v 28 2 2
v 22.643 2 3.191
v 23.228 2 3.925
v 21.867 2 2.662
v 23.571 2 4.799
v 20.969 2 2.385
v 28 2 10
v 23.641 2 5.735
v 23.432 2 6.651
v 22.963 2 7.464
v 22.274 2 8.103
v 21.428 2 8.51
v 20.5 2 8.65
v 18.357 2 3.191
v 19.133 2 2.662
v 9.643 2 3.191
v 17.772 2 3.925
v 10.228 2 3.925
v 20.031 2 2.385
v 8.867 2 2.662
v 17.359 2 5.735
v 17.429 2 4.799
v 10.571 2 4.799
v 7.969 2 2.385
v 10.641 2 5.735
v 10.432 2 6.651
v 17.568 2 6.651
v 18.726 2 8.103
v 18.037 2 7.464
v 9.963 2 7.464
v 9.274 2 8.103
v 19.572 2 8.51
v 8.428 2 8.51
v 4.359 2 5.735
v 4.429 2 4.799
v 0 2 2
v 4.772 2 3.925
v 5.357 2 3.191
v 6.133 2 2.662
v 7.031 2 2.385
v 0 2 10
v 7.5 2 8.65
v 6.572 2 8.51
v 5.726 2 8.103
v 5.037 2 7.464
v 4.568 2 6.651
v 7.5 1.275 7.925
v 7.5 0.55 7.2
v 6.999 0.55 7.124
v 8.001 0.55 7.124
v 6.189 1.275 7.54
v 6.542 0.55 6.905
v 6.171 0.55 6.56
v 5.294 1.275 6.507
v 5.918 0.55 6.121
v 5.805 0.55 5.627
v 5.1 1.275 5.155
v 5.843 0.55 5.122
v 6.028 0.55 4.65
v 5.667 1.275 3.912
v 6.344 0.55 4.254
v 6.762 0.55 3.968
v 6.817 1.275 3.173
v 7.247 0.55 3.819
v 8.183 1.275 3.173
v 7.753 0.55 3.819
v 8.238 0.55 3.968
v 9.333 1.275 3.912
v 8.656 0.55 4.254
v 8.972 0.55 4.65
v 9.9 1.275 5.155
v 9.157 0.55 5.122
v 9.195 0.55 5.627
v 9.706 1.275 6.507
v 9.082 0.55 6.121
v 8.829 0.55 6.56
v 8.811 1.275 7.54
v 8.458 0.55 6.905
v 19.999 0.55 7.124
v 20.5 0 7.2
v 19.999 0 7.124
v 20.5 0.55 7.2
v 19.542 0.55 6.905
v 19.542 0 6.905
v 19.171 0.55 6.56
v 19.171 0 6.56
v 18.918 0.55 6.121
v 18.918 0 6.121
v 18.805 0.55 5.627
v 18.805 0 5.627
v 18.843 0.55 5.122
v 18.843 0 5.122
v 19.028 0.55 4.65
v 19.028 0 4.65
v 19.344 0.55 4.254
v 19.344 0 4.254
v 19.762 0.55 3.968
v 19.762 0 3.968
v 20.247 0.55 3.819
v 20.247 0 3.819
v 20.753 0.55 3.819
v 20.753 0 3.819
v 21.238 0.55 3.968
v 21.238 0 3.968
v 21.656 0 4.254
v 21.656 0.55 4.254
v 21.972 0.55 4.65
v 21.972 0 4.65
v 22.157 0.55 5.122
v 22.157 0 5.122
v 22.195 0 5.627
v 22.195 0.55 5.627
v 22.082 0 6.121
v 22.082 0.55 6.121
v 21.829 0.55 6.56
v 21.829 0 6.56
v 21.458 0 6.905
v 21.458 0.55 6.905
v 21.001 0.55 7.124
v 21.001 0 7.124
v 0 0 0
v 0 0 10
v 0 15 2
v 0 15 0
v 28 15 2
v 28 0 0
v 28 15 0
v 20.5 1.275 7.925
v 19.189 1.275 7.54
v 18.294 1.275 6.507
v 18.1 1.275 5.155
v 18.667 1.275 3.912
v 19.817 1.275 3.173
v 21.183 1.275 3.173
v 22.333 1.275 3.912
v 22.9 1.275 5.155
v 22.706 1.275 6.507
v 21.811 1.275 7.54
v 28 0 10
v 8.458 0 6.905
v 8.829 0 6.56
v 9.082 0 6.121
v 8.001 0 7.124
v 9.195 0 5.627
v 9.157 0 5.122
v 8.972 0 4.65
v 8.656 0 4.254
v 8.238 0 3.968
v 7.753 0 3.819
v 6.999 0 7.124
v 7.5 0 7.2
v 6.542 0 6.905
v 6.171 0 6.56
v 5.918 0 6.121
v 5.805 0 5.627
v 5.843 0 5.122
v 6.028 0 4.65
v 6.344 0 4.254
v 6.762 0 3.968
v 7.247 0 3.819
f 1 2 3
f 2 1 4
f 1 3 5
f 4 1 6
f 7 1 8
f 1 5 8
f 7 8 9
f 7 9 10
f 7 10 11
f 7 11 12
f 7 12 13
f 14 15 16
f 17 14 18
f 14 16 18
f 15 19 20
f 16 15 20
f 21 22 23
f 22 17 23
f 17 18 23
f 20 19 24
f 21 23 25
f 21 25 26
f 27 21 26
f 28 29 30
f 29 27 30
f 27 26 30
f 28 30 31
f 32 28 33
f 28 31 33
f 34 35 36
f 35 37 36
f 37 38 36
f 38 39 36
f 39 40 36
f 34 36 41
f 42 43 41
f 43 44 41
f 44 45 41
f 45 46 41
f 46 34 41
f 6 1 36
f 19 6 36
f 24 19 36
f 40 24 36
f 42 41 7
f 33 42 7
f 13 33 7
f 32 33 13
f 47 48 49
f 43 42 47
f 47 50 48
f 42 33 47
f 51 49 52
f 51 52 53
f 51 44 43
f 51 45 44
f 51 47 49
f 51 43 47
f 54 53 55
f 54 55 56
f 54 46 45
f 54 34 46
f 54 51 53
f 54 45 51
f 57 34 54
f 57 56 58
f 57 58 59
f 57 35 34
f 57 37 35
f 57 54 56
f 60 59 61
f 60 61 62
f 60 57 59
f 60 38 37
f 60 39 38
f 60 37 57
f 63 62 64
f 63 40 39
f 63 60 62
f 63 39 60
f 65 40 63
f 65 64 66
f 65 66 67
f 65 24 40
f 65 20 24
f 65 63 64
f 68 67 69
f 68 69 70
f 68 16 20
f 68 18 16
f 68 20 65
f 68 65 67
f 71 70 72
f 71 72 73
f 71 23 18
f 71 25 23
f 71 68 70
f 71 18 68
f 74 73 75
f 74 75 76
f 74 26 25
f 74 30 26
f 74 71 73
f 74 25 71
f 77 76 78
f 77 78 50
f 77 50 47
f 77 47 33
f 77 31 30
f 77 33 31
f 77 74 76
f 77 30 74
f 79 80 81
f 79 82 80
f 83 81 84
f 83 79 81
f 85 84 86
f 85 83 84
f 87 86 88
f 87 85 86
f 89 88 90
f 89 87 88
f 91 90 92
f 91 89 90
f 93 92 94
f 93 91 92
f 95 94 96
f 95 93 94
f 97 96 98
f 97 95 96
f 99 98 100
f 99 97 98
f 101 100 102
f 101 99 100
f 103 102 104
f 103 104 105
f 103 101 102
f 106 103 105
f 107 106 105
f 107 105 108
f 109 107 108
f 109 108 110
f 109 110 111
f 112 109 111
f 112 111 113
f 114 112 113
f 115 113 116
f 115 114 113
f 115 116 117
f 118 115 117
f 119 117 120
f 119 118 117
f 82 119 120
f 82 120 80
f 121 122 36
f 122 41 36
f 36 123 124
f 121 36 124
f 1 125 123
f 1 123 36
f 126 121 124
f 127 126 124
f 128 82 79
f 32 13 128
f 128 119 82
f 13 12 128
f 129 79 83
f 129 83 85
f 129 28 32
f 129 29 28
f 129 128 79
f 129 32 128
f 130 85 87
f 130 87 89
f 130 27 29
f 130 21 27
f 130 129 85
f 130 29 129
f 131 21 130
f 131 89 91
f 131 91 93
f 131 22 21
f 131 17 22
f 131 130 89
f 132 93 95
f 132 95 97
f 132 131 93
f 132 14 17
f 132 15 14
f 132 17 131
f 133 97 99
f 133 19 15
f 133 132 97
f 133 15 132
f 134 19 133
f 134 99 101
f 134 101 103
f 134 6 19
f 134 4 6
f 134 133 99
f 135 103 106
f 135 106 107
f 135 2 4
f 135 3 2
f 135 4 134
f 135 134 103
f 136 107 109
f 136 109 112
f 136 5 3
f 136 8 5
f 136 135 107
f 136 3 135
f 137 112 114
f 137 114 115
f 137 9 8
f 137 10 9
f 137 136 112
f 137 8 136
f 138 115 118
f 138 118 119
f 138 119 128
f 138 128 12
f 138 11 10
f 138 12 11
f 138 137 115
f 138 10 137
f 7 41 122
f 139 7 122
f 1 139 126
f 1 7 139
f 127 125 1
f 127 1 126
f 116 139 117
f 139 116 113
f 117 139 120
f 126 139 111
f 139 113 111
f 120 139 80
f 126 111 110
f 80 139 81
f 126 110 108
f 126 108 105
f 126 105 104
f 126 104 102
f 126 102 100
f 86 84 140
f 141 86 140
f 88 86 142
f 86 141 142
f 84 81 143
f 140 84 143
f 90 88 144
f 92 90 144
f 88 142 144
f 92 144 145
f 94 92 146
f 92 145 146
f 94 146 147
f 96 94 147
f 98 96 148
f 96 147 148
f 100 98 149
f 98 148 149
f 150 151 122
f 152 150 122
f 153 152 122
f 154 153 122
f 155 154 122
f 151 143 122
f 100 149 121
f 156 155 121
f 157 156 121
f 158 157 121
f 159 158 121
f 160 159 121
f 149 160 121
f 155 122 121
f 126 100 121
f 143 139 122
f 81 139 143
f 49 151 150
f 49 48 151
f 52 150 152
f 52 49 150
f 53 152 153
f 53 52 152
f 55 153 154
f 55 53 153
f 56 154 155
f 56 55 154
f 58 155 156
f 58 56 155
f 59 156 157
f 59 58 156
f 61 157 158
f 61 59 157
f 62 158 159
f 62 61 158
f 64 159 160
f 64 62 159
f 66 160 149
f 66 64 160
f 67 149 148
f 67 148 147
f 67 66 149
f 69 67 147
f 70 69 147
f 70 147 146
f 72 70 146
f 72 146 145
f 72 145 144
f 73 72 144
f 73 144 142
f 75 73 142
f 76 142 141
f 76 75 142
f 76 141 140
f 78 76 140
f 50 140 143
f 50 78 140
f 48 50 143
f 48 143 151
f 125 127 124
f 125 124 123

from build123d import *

# Parameters (mm, degrees)
BOSS_EXTRUDE1_DEPTH                          = 28
CSK_FOR_M3_COUNTERSUNK_FLAT_HEAD_SCR_2_COUNT = 2
CSK_FOR_M3_COUNTERSUNK_FLAT_HEAD_SCR_2_PITCH = 13


with BuildPart() as part:
    # Sketch1 → Boss-Extrude1 (new body)
    with BuildSketch(Plane(origin=(0, 0, 0), x_dir=(0, 0, -1), z_dir=(1, 0, 0))):
        Polygon((-10, 0), (0, 0), (0, 15), (-2, 15), (-2, 2), (-10, 2), align=None)
    extrude(amount=BOSS_EXTRUDE1_DEPTH)

    # Sketch3 → CSK for M3 Countersunk Flat Head Screw1 (revolve, cut)
    with BuildSketch(Plane(origin=(7.5, 2, 5.5), x_dir=(0, 0, 1), z_dir=(1, 0, 0))):
        Polygon((0, 0), (0, 2), (1.7, 2), (1.7, 1.45), (3.15, 0), align=None)
    csk_for_m3_countersunk_flat_head_screw1 = revolve(axis=Axis((7.5, 8.35, 5.5), (0, -1, 0)), mode=Mode.SUBTRACT)

    # CSK for M3 Countersunk Flat Head Scr 2: CSK for M3 Countersunk Flat Head Screw1 ×2
    with Locations(*[(i * CSK_FOR_M3_COUNTERSUNK_FLAT_HEAD_SCR_2_PITCH, 0, 0) for i in range(1, CSK_FOR_M3_COUNTERSUNK_FLAT_HEAD_SCR_2_COUNT)]):
        add(csk_for_m3_countersunk_flat_head_screw1, mode=Mode.SUBTRACT)


solid = part.part
